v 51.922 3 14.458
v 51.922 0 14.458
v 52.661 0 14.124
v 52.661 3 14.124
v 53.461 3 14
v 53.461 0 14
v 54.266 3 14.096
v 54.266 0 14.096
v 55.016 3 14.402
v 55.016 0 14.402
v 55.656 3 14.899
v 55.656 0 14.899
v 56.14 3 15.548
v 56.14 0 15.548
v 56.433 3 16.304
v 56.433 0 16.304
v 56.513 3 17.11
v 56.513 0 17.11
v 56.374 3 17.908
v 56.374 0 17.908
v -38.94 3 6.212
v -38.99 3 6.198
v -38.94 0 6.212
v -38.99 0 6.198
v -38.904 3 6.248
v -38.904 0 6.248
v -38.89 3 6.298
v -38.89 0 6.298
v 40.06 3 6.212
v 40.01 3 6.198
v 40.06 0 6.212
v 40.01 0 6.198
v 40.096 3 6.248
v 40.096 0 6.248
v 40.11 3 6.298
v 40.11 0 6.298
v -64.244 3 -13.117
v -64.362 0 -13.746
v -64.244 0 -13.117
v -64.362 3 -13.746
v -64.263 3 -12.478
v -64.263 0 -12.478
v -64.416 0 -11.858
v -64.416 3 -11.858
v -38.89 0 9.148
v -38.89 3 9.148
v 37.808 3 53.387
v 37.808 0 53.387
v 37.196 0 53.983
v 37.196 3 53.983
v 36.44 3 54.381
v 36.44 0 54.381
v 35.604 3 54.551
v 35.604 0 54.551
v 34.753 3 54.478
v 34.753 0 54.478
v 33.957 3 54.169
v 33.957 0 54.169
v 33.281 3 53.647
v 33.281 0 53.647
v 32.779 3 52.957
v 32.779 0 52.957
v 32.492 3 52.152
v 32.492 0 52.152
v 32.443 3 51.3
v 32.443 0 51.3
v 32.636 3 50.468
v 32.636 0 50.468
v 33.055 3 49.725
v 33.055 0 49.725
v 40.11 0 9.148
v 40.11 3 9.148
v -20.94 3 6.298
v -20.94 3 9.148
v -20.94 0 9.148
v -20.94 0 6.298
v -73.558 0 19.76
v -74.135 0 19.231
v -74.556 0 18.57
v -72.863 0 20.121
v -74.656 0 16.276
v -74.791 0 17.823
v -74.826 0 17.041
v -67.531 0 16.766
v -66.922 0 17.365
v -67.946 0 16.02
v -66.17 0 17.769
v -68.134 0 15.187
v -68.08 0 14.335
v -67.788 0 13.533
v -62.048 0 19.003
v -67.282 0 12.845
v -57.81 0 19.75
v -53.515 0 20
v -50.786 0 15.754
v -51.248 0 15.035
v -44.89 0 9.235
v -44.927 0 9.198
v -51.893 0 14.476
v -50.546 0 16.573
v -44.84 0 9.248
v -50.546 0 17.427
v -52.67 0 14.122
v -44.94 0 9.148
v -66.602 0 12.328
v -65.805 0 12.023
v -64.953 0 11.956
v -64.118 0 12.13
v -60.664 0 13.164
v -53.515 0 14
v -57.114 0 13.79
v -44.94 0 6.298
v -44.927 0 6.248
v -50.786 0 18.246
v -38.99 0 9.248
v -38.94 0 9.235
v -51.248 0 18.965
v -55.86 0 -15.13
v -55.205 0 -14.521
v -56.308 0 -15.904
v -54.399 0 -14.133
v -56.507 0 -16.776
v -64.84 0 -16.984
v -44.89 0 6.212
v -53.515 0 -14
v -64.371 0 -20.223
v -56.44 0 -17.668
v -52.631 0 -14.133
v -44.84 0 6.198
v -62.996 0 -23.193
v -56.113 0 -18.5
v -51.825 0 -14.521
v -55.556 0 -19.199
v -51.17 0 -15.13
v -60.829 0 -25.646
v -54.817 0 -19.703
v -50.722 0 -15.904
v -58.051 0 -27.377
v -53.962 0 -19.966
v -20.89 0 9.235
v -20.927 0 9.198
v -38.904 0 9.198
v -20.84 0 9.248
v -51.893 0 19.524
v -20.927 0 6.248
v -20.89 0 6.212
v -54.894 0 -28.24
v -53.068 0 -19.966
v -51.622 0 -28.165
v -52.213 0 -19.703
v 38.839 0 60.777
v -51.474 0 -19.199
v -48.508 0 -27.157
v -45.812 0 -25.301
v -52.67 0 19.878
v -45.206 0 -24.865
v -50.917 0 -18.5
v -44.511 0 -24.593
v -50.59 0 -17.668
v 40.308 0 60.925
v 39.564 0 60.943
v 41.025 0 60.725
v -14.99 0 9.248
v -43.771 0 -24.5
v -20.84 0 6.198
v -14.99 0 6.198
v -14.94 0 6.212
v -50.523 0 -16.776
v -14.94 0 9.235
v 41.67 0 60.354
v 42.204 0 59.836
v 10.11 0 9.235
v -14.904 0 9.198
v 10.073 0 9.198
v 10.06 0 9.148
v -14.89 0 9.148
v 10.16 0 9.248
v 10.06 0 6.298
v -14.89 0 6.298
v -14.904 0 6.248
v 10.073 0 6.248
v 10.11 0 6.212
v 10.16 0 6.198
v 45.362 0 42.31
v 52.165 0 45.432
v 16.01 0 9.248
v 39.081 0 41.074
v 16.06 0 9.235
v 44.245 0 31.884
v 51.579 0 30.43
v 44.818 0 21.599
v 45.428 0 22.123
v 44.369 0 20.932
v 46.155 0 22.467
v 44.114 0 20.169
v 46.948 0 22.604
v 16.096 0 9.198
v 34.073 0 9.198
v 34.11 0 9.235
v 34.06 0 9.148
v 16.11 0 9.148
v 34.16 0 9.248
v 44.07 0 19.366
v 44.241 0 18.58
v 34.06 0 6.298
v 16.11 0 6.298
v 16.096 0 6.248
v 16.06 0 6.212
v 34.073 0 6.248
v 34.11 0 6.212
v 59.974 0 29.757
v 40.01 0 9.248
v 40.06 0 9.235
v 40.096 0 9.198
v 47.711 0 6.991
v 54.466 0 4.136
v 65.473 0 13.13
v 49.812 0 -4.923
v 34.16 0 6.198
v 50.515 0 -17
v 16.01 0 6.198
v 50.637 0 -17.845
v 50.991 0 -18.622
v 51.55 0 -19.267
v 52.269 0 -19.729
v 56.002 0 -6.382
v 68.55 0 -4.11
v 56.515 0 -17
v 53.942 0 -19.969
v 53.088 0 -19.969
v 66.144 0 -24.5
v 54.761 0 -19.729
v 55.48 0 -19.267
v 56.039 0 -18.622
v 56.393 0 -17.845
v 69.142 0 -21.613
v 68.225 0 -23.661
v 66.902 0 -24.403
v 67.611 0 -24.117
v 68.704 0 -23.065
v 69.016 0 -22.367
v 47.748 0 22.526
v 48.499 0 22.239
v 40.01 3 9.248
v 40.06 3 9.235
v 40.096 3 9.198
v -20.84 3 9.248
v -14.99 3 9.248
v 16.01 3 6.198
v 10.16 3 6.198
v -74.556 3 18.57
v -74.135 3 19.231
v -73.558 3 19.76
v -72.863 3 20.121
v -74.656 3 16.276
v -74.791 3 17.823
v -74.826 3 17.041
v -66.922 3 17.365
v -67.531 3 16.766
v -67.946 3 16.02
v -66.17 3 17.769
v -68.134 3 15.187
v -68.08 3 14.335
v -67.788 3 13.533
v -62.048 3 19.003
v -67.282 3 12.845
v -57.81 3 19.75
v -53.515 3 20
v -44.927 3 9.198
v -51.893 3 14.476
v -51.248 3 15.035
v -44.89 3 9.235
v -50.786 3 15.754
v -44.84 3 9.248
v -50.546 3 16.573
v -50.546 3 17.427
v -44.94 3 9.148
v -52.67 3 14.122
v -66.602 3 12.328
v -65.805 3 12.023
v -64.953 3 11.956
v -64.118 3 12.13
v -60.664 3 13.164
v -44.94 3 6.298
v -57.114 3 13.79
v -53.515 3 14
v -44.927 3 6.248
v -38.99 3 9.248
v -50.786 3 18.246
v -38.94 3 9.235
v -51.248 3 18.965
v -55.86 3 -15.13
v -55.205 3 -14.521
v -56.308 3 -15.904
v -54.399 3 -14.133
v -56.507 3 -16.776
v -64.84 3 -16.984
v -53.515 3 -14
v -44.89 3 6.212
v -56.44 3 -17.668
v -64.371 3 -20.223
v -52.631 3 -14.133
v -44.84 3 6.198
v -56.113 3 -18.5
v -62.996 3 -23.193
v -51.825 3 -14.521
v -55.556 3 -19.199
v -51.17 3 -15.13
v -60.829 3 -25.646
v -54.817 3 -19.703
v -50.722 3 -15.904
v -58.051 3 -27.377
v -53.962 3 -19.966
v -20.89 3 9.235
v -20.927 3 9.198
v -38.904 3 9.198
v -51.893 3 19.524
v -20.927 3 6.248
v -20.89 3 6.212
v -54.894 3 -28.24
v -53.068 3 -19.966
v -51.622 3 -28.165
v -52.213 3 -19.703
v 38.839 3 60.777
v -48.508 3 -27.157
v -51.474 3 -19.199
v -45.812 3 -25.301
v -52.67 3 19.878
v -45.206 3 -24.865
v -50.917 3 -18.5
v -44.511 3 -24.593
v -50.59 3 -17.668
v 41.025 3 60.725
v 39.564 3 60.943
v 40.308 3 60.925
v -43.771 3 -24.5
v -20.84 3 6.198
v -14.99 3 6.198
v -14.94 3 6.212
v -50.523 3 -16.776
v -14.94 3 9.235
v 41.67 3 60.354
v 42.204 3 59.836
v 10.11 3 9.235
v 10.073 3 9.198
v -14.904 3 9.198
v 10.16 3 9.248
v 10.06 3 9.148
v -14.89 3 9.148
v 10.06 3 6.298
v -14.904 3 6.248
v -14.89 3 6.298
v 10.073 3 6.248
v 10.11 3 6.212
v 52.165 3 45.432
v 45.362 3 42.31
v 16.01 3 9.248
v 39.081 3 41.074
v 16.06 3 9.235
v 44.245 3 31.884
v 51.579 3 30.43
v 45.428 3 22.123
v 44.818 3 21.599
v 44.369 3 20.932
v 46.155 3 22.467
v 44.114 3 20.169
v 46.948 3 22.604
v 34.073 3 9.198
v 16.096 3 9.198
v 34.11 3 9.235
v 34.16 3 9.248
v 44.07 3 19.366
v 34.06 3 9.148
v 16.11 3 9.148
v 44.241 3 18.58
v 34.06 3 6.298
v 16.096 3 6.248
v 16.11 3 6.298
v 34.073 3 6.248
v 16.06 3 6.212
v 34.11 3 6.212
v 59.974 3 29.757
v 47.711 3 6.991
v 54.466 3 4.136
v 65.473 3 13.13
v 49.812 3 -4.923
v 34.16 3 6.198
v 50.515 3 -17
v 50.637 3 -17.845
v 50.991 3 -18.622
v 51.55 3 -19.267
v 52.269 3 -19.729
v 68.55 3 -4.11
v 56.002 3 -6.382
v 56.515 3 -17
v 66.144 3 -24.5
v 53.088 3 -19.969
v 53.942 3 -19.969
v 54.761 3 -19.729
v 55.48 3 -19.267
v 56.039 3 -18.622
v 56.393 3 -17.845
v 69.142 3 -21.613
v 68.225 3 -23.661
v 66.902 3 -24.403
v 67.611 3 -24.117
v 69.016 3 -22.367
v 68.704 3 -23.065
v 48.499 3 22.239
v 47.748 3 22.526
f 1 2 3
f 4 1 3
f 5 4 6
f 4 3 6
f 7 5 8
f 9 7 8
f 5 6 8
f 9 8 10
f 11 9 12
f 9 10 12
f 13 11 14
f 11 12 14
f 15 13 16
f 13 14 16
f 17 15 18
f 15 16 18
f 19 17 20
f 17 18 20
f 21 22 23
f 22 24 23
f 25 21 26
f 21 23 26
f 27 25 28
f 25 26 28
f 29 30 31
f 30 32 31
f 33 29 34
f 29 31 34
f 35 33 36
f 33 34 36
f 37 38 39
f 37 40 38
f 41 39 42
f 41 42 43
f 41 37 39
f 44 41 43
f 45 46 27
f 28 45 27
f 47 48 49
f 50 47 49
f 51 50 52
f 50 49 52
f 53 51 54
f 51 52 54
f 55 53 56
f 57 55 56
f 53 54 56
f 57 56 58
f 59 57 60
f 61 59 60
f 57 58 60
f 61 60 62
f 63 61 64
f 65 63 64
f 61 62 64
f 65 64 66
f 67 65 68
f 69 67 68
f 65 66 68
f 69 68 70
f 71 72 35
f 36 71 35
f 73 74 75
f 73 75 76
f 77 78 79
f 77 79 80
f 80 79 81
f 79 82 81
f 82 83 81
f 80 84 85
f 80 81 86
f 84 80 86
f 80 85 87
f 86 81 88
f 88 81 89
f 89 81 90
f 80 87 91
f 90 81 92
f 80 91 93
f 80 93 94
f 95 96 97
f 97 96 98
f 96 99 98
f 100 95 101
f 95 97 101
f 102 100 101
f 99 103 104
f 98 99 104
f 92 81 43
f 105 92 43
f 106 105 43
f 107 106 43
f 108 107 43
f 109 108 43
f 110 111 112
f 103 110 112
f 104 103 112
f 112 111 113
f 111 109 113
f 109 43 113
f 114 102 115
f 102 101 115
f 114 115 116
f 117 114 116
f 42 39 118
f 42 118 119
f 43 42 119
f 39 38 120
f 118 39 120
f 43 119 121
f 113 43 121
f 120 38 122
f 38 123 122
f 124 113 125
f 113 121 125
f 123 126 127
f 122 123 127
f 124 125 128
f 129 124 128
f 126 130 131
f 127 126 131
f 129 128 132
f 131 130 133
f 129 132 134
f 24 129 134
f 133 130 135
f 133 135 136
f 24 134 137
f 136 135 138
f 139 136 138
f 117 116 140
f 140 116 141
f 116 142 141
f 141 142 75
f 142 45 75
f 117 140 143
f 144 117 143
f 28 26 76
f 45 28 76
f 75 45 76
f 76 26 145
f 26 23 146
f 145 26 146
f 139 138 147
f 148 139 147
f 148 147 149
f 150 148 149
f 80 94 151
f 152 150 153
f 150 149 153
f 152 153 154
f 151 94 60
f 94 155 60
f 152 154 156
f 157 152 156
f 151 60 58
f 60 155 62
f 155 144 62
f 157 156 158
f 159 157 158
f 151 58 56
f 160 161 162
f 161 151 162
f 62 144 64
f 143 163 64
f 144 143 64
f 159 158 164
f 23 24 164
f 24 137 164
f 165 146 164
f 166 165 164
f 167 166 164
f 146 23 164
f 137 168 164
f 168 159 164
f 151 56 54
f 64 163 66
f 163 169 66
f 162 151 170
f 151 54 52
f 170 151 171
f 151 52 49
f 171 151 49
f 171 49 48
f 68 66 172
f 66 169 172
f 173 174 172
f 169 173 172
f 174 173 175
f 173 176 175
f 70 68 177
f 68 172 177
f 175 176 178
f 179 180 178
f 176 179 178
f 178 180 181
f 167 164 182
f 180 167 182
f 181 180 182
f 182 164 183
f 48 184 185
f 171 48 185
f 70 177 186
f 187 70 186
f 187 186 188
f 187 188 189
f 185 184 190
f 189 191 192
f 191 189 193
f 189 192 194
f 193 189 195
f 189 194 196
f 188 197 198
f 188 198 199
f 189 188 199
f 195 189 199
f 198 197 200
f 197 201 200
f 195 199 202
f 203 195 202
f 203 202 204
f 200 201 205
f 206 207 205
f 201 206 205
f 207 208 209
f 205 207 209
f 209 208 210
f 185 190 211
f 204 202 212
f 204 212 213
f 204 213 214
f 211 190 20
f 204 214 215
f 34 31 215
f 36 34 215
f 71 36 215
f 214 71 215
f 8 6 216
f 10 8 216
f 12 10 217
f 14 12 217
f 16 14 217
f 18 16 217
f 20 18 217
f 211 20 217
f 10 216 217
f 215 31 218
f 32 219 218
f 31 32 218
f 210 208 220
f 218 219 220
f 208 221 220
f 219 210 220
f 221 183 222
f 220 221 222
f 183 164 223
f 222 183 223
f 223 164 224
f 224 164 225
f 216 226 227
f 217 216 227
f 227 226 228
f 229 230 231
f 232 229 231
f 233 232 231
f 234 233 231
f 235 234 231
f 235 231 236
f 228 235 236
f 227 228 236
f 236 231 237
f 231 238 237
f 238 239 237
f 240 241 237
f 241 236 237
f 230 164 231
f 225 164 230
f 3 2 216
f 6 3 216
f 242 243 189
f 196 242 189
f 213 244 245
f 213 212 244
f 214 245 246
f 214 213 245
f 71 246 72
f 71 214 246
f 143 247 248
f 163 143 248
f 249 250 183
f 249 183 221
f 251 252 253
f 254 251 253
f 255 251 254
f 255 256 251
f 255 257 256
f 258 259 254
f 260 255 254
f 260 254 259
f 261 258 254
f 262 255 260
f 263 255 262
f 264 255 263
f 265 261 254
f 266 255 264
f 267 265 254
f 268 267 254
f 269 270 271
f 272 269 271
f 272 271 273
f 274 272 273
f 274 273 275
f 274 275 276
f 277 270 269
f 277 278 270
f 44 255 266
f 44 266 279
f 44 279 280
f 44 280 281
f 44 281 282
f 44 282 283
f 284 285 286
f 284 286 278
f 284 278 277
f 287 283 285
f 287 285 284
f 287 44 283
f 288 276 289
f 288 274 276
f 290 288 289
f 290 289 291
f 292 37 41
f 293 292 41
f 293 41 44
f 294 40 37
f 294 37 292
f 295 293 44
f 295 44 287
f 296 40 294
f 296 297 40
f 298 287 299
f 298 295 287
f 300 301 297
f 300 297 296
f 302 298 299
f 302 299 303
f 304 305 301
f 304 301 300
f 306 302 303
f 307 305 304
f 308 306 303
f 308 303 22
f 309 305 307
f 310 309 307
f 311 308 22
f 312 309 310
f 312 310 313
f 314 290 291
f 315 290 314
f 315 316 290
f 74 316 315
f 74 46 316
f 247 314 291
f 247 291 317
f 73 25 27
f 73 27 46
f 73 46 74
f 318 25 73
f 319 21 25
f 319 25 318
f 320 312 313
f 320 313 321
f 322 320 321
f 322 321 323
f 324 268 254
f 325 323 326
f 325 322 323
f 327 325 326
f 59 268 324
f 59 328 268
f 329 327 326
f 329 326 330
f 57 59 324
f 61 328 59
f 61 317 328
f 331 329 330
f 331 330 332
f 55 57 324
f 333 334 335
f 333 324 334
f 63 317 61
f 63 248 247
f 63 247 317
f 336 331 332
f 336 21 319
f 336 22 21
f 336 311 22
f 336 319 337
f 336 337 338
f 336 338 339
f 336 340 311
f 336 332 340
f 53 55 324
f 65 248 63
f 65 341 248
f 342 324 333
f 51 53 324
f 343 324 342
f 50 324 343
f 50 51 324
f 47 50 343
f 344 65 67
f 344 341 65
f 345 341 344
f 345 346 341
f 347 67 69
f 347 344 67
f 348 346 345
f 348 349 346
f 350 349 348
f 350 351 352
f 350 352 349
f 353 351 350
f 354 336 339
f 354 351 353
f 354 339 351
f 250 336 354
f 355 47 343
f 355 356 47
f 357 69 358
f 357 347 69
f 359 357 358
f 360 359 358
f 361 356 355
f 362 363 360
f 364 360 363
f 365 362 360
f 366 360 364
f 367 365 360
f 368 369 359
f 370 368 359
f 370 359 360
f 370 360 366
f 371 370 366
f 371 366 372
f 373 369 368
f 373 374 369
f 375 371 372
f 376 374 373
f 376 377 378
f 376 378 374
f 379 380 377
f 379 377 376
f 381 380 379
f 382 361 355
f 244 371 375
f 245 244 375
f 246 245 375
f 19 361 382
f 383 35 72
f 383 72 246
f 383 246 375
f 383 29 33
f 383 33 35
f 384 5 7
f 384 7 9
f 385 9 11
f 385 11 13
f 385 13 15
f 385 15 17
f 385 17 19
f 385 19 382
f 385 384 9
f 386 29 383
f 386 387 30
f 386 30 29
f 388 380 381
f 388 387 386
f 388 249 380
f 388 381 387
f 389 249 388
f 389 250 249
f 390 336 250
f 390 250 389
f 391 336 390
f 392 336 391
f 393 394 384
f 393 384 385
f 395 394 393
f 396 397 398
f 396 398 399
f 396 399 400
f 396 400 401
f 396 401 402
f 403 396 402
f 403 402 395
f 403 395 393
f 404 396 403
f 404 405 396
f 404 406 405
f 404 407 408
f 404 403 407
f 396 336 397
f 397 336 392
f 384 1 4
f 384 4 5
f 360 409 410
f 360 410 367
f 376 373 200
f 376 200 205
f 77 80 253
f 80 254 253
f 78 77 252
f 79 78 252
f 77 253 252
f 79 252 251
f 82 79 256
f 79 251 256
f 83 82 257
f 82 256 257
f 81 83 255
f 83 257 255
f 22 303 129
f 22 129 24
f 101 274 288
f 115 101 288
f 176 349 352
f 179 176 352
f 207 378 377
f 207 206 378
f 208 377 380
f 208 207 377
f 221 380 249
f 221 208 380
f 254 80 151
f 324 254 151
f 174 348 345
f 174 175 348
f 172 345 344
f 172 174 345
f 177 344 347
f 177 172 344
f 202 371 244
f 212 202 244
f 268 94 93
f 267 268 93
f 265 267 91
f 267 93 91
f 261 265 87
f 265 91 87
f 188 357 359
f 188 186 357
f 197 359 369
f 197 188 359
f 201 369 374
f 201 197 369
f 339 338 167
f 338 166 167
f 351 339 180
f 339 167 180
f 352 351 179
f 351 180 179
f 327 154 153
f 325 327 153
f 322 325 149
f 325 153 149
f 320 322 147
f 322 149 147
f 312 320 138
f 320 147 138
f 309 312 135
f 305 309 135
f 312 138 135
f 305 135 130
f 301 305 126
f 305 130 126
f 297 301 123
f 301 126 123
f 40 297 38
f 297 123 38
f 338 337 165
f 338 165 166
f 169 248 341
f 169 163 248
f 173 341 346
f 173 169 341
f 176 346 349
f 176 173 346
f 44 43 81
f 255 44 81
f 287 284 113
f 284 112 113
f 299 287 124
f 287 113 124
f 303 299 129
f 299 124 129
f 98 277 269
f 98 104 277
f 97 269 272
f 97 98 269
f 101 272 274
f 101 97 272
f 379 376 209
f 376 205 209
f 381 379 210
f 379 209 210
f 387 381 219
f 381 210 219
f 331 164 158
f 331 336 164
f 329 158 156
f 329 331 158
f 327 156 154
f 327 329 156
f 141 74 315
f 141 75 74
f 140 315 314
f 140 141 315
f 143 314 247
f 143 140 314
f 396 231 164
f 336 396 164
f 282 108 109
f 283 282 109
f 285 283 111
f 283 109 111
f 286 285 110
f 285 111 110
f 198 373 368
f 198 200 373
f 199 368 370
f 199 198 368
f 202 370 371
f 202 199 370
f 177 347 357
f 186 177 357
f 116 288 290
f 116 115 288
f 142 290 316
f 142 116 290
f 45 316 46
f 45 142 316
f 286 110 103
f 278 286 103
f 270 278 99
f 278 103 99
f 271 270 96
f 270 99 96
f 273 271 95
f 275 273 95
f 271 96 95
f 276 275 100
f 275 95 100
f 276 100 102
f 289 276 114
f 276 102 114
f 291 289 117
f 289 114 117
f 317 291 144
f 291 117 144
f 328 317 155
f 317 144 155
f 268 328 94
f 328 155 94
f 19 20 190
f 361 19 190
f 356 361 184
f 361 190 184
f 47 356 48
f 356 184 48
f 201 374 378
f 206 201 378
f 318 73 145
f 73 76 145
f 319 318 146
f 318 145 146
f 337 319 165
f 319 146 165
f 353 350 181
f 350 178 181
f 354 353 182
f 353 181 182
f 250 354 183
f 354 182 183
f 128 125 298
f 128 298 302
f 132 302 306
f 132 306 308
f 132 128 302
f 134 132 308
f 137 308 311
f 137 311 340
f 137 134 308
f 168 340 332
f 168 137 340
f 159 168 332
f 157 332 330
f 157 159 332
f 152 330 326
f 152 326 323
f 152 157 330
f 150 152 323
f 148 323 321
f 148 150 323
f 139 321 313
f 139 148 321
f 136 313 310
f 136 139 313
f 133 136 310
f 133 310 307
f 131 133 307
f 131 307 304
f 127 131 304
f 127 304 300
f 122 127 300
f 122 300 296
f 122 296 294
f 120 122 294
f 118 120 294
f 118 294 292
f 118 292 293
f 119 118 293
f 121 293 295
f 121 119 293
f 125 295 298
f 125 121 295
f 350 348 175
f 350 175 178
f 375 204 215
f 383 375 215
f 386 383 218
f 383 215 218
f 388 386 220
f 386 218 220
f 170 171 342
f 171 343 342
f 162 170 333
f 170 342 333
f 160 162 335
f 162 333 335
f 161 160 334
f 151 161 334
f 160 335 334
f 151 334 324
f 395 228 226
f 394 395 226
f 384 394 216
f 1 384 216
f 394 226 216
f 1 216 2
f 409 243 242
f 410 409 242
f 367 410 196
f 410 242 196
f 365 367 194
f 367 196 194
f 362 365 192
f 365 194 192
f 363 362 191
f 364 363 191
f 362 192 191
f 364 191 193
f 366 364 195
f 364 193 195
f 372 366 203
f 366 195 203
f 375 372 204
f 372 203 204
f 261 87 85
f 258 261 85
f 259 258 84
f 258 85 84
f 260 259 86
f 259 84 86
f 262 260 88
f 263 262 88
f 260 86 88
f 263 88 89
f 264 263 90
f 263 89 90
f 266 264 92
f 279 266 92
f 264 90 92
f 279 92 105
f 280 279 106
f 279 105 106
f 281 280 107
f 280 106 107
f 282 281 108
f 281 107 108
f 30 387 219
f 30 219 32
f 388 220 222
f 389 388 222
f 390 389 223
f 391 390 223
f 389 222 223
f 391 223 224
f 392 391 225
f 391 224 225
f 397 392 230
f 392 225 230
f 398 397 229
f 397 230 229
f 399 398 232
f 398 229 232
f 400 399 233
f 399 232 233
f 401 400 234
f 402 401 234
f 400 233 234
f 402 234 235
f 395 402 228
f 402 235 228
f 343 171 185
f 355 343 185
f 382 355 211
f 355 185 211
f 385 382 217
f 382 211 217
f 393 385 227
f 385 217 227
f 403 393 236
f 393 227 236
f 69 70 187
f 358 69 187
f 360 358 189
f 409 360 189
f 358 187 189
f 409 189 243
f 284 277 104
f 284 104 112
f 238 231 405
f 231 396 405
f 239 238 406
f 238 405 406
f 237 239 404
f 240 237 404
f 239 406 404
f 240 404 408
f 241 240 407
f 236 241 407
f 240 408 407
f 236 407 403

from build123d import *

# Parameters (mm, degrees)
SKETCH1_R           = 3
BOSS_EXTRUDE1_DEPTH = 3
FILLET1_R           = 3
CUT_EXTRUDE1_REACH  = 98.569
WELD_SKETCH_W       = 6.05
WELD_SKETCH_H       = 3.05
FILLET2_R           = 0.1


with BuildPart() as part:
    # Sketch1 → Boss-Extrude1 (new body)
    with BuildSketch(Plane(origin=(0, 0, 0), x_dir=(1, 0, 0), z_dir=(0, 1, 0))):
        with BuildLine():
            Line((68.999142959, 24.5), (-45.03, 24.5))
            ThreePointArc((-45.03, 24.5), (-59.42765336, 26.658455117), (-64.053442962, 12.85434626))
            Line((-64.053442962, 12.85434626), (-75.682127835, -19.095202846))
            Line((-75.682127835, -19.095202846), (40.839757142, -61.505700619))
            ThreePointArc((40.839757142, -61.505700619), (63.135225428, -21.192802103), (68.999142959, 24.5))
        make_face()
        with BuildLine():
            ThreePointArc((-66.169745277, -17.768626979), (-67.962762758, -13.923488739), (-64.117624541, -12.130471209))
            ThreePointArc((-64.117624541, -12.130471209), (-58.898093563, -13.529040334), (-53.515000008, -14))
            ThreePointArc((-53.515000008, -14), (-50.515, -17.000000016), (-53.51500004, -20))
            ThreePointArc((-53.51500004, -20), (-59.93998258, -19.43788686), (-66.169745277, -17.768626979))
        make_face(mode=Mode.SUBTRACT)
        with Locations(Location((-53.515, 17, 0), (0, 0, 270))):
            Circle(SKETCH1_R, mode=Mode.SUBTRACT)
        with BuildLine():
            ThreePointArc((51.922241647, -14.457733132), (55.352806586, -14.628825828), (56.374201386, -17.908277181))
            ThreePointArc((56.374201386, -17.908277181), (48.64297905, -36.460001059), (37.807738396, -53.387369951))
            ThreePointArc((37.807738396, -53.387369951), (33.600211268, -53.932086993), (33.055494505, -49.724559828))
            ThreePointArc((33.055494505, -49.724559828), (41.773694842, -36.541404897), (48.499417973, -22.238704473))
            ThreePointArc((48.499417973, -22.238704473), (45.1053197, -21.881948257), (44.241223395, -18.580355359))
            ThreePointArc((44.241223395, -18.580355359), (48.93455056, -1.064619844), (50.515, 17))
            ThreePointArc((50.515, 17), (53.515, 20), (56.515, 17))
            ThreePointArc((56.515, 17), (55.360756251, 1.104384228), (51.922241647, -14.457733132))
        make_face(mode=Mode.SUBTRACT)
    extrude(amount=BOSS_EXTRUDE1_DEPTH)

    # Fillet1
    fillet1_edges = [part.edges().sort_by_distance(p)[0] for p in [
        (68.999142959, 1.5, -24.5),
        (40.839757142, 1.5, 61.505700619),
        (-75.682127835, 1.5, 19.095202846),
        (-64.053442962, 1.5, -12.85434626),
        (-45.03, 1.5, -24.5),
    ]]
    fillet(fillet1_edges, radius=FILLET1_R)

    # weld sketch → Cut-Extrude1 (cut, up to next)
    with BuildSketch(Plane(origin=(0, 3, 0), x_dir=(1, 0, 0), z_dir=(0, 1, 0)), mode=Mode.PRIVATE) as cut_extrude1_sk1:
        with Locations((-41.915170648, -7.723381887)):
            Rectangle(WELD_SKETCH_W, WELD_SKETCH_H)
    cut_extrude1_tool1 = extrude(cut_extrude1_sk1.sketch, amount=-CUT_EXTRUDE1_REACH, mode=Mode.PRIVATE) & part.part
    # weld sketch → Cut-Extrude1 (cut, up to next)
    with BuildSketch(Plane(origin=(0, 3, 0), x_dir=(1, 0, 0), z_dir=(0, 1, 0)), mode=Mode.PRIVATE) as cut_extrude1_sk2:
        with Locations((-17.915170648, -7.723381887)):
            Rectangle(WELD_SKETCH_W, WELD_SKETCH_H)
    cut_extrude1_tool2 = extrude(cut_extrude1_sk2.sketch, amount=-CUT_EXTRUDE1_REACH, mode=Mode.PRIVATE) & part.part
    # weld sketch → Cut-Extrude1 (cut, up to next)
    with BuildSketch(Plane(origin=(0, 3, 0), x_dir=(1, 0, 0), z_dir=(0, 1, 0)), mode=Mode.PRIVATE) as cut_extrude1_sk3:
        with Locations((37.084829352, -7.723381887)):
            Rectangle(WELD_SKETCH_W, WELD_SKETCH_H)
    cut_extrude1_tool3 = extrude(cut_extrude1_sk3.sketch, amount=-CUT_EXTRUDE1_REACH, mode=Mode.PRIVATE) & part.part
    # weld sketch → Cut-Extrude1 (cut, up to next)
    with BuildSketch(Plane(origin=(0, 3, 0), x_dir=(1, 0, 0), z_dir=(0, 1, 0)), mode=Mode.PRIVATE) as cut_extrude1_sk4:
        with Locations((13.084829352, -7.723381887)):
            Rectangle(WELD_SKETCH_W, WELD_SKETCH_H)
    cut_extrude1_tool4 = extrude(cut_extrude1_sk4.sketch, amount=-CUT_EXTRUDE1_REACH, mode=Mode.PRIVATE) & part.part
    add(cut_extrude1_tool1.solids().sort_by_distance((-41.915171, 3, 7.723382))[0], mode=Mode.SUBTRACT)
    add(cut_extrude1_tool2.solids().sort_by_distance((-17.915171, 3, 7.723382))[0], mode=Mode.SUBTRACT)
    add(cut_extrude1_tool3.solids().sort_by_distance((37.084829, 3, 7.723382))[0], mode=Mode.SUBTRACT)
    add(cut_extrude1_tool4.solids().sort_by_distance((13.084829, 3, 7.723382))[0], mode=Mode.SUBTRACT)

    # Fillet2
    fillet2_edges = [part.edges().sort_by_distance(p)[0] for p in [
        (-38.890170648, 1.5, 9.248381887),
        (-44.940170648, 1.5, 9.248381887),
        (-44.940170648, 1.5, 6.198381887),
        (-38.890170648, 1.5, 6.198381887),
        (-14.890170648, 1.5, 9.248381887),
        (-20.940170648, 1.5, 9.248381887),
        (-20.940170648, 1.5, 6.198381887),
        (-14.890170648, 1.5, 6.198381887),
        (10.059829352, 1.5, 9.248381887),
        (10.059829352, 1.5, 6.198381887),
        (16.109829352, 1.5, 6.198381887),
        (16.109829352, 1.5, 9.248381887),
        (40.109829352, 1.5, 6.198381887),
        (40.109829352, 1.5, 9.248381887),
        (34.059829352, 1.5, 9.248381887),
        (34.059829352, 1.5, 6.198381887),
    ]]
    fillet(fillet2_edges, radius=FILLET2_R)


solid = part.part
